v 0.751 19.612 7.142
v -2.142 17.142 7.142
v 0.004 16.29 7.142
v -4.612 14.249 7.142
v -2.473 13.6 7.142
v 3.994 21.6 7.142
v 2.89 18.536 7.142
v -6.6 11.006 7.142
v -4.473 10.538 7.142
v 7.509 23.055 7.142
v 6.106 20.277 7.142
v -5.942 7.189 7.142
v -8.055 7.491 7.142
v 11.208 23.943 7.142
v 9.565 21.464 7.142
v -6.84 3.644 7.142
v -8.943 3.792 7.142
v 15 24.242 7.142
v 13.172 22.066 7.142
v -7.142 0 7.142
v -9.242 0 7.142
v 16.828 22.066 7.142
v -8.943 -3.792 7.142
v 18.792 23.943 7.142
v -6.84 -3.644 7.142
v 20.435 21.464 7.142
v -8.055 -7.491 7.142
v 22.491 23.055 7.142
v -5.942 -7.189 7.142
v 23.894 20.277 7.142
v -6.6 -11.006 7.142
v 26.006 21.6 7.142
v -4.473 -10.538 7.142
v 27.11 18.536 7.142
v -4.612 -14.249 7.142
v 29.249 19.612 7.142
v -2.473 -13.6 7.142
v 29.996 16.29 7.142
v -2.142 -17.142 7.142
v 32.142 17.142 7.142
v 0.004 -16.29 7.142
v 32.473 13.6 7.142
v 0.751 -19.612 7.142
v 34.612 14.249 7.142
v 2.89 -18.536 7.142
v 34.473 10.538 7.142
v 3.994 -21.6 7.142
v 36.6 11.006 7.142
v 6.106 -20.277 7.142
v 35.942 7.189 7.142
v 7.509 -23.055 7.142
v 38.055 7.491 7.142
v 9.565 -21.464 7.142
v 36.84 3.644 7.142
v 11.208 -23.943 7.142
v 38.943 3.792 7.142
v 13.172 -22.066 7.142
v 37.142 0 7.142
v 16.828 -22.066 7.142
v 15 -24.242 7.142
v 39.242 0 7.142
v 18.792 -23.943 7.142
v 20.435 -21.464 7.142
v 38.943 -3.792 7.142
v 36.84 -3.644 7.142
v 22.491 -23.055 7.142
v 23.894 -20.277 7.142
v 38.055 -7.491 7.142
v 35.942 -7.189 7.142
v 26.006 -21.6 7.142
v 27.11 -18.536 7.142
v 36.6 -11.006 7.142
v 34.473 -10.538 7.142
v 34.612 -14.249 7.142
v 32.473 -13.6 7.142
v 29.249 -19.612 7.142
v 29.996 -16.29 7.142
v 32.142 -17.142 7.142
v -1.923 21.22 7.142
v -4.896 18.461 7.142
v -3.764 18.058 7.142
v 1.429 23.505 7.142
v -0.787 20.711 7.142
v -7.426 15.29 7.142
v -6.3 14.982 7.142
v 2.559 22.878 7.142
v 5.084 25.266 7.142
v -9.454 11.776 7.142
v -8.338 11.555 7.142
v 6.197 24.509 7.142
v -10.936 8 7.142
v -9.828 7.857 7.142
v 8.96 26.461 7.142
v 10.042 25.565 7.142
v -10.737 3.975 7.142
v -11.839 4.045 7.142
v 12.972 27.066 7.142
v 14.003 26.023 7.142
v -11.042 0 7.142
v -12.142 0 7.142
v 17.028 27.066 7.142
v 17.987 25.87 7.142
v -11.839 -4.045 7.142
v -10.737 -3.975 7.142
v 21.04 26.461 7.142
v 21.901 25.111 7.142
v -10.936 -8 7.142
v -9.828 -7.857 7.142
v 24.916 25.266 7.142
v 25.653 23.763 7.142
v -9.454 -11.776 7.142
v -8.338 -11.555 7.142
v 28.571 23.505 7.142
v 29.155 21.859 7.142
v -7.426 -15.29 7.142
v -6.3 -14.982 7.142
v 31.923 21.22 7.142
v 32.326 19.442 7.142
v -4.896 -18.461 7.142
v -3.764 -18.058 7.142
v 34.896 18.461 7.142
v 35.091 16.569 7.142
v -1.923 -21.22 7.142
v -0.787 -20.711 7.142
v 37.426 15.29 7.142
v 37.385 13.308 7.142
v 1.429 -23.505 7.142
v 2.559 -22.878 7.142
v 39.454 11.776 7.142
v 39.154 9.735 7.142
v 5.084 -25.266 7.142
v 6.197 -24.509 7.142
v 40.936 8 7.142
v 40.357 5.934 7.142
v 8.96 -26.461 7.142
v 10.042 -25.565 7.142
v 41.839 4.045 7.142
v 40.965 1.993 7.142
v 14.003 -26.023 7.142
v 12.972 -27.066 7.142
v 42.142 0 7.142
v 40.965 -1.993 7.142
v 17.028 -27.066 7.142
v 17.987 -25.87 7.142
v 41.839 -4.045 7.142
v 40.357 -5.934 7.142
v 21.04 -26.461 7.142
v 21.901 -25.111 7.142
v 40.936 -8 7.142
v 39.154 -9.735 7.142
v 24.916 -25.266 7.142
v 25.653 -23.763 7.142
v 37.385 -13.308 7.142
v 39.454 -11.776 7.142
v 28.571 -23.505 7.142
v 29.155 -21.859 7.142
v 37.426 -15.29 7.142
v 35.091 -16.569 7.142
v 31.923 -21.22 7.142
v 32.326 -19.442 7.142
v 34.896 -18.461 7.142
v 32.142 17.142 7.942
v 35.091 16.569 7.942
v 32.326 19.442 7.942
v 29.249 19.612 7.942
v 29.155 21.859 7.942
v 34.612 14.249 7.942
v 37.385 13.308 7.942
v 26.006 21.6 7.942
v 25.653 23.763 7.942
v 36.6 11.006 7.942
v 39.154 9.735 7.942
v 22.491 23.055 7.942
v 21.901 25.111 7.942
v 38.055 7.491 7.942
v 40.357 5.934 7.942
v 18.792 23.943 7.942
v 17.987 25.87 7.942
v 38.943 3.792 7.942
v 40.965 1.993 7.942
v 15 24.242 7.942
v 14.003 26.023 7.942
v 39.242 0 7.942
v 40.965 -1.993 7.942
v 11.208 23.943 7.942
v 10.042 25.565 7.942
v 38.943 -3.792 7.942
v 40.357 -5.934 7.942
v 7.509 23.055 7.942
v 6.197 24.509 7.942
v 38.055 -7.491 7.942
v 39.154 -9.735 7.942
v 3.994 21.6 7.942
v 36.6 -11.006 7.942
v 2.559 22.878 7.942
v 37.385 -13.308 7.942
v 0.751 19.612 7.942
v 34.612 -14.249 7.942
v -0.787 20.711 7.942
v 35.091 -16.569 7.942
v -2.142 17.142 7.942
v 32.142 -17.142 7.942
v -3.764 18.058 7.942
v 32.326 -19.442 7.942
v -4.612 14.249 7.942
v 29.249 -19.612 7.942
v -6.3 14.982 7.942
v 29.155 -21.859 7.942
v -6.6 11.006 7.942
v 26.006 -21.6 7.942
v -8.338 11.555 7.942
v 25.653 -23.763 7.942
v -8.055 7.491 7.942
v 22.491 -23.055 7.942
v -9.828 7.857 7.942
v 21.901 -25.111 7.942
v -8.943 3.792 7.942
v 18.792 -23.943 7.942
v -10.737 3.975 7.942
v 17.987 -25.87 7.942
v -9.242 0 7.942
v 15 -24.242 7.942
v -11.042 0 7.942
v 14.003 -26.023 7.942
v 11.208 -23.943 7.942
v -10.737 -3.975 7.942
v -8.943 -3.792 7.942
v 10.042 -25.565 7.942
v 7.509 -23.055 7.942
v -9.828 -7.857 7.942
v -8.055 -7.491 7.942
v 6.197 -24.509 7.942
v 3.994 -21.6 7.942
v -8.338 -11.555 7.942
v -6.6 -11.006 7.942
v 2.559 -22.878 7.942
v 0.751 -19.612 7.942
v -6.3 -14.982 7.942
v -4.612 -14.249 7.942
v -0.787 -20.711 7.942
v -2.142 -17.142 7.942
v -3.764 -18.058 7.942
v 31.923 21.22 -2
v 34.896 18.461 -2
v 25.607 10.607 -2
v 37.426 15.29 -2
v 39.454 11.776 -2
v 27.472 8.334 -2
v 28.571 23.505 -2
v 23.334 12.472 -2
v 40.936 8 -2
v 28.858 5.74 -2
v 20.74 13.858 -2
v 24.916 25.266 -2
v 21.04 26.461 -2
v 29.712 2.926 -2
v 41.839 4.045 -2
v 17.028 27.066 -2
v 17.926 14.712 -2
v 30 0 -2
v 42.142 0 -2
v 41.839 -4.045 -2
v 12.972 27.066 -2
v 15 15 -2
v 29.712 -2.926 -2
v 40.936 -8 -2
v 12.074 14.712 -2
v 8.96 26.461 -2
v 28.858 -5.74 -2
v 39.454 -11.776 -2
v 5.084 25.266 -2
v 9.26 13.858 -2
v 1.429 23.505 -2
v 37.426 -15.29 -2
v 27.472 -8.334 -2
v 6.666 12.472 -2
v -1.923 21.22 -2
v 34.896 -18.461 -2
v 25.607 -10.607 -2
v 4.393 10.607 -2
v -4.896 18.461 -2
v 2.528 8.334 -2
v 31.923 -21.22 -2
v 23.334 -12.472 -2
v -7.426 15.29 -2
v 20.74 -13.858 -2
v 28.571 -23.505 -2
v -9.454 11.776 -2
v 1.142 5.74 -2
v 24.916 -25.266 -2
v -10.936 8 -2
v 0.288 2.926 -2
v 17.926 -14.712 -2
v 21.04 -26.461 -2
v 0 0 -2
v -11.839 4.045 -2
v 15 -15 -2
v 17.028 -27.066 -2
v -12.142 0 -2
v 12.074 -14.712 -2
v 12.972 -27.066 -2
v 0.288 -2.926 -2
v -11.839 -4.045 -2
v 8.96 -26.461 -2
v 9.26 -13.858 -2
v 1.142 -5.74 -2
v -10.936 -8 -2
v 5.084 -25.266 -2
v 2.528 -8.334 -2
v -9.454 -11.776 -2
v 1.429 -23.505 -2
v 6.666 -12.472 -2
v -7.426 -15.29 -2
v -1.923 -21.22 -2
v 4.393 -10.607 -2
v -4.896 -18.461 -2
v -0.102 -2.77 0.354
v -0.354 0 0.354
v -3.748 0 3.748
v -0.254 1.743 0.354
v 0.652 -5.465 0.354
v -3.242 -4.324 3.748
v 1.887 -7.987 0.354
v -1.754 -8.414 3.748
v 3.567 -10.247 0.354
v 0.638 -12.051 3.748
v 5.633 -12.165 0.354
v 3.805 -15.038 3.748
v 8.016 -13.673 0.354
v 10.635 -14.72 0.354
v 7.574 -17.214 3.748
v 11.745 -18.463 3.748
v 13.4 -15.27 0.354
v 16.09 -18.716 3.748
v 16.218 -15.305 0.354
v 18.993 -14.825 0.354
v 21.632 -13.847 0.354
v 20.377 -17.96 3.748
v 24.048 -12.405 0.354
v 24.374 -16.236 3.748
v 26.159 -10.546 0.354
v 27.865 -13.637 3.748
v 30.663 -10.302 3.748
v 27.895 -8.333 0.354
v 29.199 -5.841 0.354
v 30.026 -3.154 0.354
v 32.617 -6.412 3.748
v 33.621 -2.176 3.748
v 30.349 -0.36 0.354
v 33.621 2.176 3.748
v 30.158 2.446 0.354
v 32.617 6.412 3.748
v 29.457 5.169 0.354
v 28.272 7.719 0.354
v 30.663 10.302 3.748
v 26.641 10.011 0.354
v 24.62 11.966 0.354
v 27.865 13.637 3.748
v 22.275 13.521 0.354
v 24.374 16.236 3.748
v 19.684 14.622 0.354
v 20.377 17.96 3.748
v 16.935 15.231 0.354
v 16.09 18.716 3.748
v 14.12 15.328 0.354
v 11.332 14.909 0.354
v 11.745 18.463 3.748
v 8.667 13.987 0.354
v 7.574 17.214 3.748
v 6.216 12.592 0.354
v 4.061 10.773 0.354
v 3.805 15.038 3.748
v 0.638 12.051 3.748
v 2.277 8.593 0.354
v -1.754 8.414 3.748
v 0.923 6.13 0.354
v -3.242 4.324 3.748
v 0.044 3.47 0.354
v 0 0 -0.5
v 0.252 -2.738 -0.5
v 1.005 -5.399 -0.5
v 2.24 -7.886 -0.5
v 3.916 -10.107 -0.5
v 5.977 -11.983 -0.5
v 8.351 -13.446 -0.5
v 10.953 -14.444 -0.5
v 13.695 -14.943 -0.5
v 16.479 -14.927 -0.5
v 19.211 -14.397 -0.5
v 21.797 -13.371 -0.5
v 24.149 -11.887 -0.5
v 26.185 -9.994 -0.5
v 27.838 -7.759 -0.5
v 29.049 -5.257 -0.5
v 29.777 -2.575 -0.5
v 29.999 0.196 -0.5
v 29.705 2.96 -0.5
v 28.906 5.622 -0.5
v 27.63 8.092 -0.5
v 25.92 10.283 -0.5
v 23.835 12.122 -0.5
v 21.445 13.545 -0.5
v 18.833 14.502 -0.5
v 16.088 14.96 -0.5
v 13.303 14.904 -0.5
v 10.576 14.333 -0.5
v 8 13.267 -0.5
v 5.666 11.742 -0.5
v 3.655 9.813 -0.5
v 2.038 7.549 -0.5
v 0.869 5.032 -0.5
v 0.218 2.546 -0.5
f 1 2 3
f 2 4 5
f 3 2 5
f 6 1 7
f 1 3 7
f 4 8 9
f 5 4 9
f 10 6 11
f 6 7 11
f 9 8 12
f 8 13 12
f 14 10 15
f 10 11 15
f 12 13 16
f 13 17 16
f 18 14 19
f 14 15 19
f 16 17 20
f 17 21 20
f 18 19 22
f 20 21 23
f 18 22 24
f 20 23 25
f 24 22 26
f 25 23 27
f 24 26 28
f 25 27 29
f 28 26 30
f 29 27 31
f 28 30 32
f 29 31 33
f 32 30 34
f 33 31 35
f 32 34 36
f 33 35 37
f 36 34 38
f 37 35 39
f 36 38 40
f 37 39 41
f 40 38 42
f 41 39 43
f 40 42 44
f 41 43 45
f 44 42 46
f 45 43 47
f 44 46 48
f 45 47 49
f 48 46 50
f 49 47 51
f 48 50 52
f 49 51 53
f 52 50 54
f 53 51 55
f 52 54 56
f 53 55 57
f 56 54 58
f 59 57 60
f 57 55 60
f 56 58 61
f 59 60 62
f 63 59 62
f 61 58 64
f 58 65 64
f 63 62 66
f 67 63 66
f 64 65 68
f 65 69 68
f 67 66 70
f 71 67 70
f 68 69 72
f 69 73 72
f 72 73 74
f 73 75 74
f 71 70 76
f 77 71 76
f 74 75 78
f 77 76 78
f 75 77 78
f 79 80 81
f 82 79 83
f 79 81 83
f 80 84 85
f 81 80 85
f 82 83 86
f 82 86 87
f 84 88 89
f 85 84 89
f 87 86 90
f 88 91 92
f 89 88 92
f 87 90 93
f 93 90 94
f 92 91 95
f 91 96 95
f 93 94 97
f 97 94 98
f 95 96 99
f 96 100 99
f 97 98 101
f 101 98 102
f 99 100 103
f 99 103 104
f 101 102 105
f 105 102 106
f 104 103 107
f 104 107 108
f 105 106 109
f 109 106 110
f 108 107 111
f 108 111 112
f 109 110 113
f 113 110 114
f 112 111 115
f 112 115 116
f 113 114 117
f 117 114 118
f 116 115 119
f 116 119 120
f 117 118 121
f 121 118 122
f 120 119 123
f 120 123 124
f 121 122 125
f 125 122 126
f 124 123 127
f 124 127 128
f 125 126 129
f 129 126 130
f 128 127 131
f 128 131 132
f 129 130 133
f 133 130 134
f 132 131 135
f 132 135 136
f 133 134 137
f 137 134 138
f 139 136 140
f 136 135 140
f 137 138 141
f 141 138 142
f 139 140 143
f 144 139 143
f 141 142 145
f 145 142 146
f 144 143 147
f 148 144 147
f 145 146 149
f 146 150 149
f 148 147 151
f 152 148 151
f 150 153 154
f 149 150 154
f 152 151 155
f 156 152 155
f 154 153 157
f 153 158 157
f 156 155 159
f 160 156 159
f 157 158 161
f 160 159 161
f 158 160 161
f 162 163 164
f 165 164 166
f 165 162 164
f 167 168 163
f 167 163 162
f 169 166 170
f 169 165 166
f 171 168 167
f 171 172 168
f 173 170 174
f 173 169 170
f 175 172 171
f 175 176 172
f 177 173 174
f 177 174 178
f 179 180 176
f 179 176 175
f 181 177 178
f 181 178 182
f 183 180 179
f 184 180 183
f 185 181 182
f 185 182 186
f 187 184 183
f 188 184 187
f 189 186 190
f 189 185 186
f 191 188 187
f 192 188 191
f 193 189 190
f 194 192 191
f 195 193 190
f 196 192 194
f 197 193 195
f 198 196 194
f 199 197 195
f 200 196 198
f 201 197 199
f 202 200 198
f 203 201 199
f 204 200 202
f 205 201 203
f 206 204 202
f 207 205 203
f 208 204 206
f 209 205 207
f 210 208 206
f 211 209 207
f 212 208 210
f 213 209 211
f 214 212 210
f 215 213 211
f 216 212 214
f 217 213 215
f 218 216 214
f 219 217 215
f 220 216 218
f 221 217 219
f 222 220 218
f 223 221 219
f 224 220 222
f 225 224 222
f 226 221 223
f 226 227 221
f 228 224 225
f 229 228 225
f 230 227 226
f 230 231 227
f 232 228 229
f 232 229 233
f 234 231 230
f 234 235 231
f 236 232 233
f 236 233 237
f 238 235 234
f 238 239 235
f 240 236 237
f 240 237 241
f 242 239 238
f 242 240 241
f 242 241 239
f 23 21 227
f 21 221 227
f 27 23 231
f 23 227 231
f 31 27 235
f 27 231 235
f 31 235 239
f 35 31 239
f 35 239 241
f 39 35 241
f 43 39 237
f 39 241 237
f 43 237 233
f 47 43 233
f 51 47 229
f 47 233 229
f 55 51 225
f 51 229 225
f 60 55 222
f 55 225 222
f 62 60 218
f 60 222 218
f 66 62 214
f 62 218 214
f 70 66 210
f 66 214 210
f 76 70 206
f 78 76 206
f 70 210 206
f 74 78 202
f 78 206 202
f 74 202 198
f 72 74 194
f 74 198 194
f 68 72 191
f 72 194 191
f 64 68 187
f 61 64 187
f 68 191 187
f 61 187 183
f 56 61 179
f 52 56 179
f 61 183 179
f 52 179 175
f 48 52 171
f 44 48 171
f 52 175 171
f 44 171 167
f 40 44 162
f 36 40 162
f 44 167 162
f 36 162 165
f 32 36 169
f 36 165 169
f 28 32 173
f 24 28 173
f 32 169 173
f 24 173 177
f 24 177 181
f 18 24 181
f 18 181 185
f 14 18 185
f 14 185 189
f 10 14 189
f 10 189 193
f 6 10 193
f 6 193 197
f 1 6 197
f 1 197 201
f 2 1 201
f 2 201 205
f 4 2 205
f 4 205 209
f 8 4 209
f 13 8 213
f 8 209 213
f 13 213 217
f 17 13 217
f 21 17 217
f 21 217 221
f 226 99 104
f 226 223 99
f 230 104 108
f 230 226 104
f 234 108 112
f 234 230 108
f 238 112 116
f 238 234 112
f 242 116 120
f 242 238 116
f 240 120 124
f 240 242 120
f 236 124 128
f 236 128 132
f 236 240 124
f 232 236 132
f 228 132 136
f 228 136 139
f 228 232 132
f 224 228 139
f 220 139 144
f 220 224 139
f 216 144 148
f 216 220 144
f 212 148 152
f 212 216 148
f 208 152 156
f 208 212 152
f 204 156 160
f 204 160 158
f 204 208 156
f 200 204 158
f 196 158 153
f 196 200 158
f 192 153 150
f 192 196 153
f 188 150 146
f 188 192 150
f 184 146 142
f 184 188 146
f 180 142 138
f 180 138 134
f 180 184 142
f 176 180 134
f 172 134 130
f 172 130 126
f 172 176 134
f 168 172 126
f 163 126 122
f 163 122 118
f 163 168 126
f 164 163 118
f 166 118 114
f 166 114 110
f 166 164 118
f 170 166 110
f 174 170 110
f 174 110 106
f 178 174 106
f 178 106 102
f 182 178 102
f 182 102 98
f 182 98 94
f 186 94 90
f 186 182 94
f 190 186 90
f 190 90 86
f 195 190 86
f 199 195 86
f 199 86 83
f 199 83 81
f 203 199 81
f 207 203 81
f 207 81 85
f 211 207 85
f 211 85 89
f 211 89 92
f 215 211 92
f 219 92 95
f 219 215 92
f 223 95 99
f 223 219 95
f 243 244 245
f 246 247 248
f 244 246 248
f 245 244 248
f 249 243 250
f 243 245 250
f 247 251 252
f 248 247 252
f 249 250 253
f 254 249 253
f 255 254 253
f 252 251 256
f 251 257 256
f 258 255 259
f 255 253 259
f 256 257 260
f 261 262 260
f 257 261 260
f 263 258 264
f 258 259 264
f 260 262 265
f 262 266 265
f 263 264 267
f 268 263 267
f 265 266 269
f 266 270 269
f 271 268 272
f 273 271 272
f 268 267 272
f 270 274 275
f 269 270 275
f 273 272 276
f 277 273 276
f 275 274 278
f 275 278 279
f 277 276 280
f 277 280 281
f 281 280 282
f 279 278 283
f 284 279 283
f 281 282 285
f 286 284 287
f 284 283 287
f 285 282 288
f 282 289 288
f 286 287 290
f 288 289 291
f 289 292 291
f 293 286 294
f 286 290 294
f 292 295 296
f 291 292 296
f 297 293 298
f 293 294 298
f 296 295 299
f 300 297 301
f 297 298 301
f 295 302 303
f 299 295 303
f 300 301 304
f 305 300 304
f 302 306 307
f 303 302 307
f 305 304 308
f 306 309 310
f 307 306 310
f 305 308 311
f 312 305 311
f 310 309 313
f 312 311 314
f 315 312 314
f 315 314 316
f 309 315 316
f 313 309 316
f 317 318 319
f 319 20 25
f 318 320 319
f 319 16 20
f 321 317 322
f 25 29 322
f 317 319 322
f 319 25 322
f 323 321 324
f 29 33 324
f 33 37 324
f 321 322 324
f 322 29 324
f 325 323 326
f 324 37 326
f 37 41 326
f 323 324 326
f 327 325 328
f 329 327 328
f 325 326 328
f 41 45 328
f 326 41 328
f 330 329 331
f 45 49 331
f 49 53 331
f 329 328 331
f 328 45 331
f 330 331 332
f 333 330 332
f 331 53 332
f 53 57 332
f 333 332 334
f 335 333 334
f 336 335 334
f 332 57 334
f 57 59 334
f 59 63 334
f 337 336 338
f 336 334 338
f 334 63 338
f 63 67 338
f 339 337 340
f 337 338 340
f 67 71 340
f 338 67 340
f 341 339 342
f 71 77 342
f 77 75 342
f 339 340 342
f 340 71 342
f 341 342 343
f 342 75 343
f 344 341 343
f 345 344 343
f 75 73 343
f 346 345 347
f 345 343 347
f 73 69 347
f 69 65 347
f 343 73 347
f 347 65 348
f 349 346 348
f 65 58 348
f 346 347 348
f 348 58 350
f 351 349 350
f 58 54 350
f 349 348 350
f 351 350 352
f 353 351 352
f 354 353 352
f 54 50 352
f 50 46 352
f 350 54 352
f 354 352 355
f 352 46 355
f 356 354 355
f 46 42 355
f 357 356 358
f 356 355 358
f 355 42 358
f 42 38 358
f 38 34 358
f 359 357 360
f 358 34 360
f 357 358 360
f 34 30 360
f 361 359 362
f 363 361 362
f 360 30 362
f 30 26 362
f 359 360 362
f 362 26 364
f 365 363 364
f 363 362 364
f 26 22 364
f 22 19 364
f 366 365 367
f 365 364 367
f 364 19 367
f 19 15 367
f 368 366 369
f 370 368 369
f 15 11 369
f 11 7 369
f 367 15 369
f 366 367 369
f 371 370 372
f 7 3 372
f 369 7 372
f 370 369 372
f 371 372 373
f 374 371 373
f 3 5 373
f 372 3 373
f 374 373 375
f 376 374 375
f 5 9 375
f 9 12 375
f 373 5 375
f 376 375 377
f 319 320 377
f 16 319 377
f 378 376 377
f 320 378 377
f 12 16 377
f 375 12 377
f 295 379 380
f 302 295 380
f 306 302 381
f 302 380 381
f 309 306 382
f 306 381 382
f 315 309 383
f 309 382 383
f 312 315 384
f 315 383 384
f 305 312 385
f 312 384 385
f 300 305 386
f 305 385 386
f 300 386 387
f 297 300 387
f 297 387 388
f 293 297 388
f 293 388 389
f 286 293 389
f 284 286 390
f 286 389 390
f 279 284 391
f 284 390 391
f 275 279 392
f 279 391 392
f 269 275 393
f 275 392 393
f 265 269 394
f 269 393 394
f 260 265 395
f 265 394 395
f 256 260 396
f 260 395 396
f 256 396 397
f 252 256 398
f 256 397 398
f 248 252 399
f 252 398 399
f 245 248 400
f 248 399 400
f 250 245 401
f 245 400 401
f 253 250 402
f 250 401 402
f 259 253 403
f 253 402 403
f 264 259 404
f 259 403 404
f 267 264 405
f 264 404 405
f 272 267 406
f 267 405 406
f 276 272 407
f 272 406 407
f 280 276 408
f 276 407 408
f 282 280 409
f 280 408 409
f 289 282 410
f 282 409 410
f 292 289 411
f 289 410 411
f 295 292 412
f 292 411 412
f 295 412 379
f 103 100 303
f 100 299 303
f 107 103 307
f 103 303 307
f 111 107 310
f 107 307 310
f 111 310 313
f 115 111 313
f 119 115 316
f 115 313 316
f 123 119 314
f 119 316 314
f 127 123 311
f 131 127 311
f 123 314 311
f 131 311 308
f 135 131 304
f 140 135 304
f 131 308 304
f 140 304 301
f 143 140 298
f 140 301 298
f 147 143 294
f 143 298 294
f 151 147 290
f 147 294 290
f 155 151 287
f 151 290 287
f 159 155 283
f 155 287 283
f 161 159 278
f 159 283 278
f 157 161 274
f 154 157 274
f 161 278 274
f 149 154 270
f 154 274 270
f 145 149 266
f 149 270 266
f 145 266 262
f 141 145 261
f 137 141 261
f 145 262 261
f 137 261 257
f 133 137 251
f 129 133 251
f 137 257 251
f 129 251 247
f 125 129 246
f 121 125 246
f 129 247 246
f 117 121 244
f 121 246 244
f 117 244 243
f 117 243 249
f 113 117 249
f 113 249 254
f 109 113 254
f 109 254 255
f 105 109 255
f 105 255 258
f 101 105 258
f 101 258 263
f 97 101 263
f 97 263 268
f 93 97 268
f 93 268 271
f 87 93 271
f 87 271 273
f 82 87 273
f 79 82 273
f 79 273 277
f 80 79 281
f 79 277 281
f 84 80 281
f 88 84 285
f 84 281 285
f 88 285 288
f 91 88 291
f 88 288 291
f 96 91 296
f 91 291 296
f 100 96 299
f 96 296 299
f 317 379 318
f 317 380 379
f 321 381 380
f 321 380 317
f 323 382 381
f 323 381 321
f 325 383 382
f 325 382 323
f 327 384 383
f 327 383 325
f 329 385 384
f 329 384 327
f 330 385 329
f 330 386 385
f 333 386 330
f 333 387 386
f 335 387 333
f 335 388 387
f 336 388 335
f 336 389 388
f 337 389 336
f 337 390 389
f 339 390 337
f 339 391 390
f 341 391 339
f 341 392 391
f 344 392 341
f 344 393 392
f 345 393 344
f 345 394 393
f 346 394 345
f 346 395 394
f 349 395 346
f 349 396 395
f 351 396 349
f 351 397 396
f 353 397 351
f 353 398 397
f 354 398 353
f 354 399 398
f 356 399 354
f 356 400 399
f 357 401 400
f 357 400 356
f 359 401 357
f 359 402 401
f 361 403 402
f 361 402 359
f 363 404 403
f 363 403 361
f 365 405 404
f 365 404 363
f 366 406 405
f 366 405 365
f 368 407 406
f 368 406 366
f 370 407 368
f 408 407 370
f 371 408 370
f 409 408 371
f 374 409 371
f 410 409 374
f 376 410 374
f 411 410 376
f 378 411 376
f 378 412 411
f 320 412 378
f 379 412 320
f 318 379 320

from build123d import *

# Parameters (mm, degrees)
F0_W    = 1.8
F0_H    = 0.8
F2_SIZE = 0.5


with BuildPart() as f1:
    # F0 (on Front) → F1 (revolve)
    with BuildSketch(Plane.XZ):
        with Locations((-10.141778, 7.541778)):
            Rectangle(F0_W, F0_H)
        Polygon((0, -2), (0, 0), (-7.141778, 7.141778), (-9.241778, 7.141778), (-11.041778, 7.141778), (-12.141778, 7.141778), (-12.141778, -2), align=None)
    revolve(axis=Axis((15, 0, 2.570889), (0, 0, 1)))

    # F2
    f2_edges = [f1.edges().sort_by_distance(p)[0] for p in [
        (30, 0, 0),
    ]]
    chamfer(f2_edges, length=F2_SIZE)


solid = f1.part
